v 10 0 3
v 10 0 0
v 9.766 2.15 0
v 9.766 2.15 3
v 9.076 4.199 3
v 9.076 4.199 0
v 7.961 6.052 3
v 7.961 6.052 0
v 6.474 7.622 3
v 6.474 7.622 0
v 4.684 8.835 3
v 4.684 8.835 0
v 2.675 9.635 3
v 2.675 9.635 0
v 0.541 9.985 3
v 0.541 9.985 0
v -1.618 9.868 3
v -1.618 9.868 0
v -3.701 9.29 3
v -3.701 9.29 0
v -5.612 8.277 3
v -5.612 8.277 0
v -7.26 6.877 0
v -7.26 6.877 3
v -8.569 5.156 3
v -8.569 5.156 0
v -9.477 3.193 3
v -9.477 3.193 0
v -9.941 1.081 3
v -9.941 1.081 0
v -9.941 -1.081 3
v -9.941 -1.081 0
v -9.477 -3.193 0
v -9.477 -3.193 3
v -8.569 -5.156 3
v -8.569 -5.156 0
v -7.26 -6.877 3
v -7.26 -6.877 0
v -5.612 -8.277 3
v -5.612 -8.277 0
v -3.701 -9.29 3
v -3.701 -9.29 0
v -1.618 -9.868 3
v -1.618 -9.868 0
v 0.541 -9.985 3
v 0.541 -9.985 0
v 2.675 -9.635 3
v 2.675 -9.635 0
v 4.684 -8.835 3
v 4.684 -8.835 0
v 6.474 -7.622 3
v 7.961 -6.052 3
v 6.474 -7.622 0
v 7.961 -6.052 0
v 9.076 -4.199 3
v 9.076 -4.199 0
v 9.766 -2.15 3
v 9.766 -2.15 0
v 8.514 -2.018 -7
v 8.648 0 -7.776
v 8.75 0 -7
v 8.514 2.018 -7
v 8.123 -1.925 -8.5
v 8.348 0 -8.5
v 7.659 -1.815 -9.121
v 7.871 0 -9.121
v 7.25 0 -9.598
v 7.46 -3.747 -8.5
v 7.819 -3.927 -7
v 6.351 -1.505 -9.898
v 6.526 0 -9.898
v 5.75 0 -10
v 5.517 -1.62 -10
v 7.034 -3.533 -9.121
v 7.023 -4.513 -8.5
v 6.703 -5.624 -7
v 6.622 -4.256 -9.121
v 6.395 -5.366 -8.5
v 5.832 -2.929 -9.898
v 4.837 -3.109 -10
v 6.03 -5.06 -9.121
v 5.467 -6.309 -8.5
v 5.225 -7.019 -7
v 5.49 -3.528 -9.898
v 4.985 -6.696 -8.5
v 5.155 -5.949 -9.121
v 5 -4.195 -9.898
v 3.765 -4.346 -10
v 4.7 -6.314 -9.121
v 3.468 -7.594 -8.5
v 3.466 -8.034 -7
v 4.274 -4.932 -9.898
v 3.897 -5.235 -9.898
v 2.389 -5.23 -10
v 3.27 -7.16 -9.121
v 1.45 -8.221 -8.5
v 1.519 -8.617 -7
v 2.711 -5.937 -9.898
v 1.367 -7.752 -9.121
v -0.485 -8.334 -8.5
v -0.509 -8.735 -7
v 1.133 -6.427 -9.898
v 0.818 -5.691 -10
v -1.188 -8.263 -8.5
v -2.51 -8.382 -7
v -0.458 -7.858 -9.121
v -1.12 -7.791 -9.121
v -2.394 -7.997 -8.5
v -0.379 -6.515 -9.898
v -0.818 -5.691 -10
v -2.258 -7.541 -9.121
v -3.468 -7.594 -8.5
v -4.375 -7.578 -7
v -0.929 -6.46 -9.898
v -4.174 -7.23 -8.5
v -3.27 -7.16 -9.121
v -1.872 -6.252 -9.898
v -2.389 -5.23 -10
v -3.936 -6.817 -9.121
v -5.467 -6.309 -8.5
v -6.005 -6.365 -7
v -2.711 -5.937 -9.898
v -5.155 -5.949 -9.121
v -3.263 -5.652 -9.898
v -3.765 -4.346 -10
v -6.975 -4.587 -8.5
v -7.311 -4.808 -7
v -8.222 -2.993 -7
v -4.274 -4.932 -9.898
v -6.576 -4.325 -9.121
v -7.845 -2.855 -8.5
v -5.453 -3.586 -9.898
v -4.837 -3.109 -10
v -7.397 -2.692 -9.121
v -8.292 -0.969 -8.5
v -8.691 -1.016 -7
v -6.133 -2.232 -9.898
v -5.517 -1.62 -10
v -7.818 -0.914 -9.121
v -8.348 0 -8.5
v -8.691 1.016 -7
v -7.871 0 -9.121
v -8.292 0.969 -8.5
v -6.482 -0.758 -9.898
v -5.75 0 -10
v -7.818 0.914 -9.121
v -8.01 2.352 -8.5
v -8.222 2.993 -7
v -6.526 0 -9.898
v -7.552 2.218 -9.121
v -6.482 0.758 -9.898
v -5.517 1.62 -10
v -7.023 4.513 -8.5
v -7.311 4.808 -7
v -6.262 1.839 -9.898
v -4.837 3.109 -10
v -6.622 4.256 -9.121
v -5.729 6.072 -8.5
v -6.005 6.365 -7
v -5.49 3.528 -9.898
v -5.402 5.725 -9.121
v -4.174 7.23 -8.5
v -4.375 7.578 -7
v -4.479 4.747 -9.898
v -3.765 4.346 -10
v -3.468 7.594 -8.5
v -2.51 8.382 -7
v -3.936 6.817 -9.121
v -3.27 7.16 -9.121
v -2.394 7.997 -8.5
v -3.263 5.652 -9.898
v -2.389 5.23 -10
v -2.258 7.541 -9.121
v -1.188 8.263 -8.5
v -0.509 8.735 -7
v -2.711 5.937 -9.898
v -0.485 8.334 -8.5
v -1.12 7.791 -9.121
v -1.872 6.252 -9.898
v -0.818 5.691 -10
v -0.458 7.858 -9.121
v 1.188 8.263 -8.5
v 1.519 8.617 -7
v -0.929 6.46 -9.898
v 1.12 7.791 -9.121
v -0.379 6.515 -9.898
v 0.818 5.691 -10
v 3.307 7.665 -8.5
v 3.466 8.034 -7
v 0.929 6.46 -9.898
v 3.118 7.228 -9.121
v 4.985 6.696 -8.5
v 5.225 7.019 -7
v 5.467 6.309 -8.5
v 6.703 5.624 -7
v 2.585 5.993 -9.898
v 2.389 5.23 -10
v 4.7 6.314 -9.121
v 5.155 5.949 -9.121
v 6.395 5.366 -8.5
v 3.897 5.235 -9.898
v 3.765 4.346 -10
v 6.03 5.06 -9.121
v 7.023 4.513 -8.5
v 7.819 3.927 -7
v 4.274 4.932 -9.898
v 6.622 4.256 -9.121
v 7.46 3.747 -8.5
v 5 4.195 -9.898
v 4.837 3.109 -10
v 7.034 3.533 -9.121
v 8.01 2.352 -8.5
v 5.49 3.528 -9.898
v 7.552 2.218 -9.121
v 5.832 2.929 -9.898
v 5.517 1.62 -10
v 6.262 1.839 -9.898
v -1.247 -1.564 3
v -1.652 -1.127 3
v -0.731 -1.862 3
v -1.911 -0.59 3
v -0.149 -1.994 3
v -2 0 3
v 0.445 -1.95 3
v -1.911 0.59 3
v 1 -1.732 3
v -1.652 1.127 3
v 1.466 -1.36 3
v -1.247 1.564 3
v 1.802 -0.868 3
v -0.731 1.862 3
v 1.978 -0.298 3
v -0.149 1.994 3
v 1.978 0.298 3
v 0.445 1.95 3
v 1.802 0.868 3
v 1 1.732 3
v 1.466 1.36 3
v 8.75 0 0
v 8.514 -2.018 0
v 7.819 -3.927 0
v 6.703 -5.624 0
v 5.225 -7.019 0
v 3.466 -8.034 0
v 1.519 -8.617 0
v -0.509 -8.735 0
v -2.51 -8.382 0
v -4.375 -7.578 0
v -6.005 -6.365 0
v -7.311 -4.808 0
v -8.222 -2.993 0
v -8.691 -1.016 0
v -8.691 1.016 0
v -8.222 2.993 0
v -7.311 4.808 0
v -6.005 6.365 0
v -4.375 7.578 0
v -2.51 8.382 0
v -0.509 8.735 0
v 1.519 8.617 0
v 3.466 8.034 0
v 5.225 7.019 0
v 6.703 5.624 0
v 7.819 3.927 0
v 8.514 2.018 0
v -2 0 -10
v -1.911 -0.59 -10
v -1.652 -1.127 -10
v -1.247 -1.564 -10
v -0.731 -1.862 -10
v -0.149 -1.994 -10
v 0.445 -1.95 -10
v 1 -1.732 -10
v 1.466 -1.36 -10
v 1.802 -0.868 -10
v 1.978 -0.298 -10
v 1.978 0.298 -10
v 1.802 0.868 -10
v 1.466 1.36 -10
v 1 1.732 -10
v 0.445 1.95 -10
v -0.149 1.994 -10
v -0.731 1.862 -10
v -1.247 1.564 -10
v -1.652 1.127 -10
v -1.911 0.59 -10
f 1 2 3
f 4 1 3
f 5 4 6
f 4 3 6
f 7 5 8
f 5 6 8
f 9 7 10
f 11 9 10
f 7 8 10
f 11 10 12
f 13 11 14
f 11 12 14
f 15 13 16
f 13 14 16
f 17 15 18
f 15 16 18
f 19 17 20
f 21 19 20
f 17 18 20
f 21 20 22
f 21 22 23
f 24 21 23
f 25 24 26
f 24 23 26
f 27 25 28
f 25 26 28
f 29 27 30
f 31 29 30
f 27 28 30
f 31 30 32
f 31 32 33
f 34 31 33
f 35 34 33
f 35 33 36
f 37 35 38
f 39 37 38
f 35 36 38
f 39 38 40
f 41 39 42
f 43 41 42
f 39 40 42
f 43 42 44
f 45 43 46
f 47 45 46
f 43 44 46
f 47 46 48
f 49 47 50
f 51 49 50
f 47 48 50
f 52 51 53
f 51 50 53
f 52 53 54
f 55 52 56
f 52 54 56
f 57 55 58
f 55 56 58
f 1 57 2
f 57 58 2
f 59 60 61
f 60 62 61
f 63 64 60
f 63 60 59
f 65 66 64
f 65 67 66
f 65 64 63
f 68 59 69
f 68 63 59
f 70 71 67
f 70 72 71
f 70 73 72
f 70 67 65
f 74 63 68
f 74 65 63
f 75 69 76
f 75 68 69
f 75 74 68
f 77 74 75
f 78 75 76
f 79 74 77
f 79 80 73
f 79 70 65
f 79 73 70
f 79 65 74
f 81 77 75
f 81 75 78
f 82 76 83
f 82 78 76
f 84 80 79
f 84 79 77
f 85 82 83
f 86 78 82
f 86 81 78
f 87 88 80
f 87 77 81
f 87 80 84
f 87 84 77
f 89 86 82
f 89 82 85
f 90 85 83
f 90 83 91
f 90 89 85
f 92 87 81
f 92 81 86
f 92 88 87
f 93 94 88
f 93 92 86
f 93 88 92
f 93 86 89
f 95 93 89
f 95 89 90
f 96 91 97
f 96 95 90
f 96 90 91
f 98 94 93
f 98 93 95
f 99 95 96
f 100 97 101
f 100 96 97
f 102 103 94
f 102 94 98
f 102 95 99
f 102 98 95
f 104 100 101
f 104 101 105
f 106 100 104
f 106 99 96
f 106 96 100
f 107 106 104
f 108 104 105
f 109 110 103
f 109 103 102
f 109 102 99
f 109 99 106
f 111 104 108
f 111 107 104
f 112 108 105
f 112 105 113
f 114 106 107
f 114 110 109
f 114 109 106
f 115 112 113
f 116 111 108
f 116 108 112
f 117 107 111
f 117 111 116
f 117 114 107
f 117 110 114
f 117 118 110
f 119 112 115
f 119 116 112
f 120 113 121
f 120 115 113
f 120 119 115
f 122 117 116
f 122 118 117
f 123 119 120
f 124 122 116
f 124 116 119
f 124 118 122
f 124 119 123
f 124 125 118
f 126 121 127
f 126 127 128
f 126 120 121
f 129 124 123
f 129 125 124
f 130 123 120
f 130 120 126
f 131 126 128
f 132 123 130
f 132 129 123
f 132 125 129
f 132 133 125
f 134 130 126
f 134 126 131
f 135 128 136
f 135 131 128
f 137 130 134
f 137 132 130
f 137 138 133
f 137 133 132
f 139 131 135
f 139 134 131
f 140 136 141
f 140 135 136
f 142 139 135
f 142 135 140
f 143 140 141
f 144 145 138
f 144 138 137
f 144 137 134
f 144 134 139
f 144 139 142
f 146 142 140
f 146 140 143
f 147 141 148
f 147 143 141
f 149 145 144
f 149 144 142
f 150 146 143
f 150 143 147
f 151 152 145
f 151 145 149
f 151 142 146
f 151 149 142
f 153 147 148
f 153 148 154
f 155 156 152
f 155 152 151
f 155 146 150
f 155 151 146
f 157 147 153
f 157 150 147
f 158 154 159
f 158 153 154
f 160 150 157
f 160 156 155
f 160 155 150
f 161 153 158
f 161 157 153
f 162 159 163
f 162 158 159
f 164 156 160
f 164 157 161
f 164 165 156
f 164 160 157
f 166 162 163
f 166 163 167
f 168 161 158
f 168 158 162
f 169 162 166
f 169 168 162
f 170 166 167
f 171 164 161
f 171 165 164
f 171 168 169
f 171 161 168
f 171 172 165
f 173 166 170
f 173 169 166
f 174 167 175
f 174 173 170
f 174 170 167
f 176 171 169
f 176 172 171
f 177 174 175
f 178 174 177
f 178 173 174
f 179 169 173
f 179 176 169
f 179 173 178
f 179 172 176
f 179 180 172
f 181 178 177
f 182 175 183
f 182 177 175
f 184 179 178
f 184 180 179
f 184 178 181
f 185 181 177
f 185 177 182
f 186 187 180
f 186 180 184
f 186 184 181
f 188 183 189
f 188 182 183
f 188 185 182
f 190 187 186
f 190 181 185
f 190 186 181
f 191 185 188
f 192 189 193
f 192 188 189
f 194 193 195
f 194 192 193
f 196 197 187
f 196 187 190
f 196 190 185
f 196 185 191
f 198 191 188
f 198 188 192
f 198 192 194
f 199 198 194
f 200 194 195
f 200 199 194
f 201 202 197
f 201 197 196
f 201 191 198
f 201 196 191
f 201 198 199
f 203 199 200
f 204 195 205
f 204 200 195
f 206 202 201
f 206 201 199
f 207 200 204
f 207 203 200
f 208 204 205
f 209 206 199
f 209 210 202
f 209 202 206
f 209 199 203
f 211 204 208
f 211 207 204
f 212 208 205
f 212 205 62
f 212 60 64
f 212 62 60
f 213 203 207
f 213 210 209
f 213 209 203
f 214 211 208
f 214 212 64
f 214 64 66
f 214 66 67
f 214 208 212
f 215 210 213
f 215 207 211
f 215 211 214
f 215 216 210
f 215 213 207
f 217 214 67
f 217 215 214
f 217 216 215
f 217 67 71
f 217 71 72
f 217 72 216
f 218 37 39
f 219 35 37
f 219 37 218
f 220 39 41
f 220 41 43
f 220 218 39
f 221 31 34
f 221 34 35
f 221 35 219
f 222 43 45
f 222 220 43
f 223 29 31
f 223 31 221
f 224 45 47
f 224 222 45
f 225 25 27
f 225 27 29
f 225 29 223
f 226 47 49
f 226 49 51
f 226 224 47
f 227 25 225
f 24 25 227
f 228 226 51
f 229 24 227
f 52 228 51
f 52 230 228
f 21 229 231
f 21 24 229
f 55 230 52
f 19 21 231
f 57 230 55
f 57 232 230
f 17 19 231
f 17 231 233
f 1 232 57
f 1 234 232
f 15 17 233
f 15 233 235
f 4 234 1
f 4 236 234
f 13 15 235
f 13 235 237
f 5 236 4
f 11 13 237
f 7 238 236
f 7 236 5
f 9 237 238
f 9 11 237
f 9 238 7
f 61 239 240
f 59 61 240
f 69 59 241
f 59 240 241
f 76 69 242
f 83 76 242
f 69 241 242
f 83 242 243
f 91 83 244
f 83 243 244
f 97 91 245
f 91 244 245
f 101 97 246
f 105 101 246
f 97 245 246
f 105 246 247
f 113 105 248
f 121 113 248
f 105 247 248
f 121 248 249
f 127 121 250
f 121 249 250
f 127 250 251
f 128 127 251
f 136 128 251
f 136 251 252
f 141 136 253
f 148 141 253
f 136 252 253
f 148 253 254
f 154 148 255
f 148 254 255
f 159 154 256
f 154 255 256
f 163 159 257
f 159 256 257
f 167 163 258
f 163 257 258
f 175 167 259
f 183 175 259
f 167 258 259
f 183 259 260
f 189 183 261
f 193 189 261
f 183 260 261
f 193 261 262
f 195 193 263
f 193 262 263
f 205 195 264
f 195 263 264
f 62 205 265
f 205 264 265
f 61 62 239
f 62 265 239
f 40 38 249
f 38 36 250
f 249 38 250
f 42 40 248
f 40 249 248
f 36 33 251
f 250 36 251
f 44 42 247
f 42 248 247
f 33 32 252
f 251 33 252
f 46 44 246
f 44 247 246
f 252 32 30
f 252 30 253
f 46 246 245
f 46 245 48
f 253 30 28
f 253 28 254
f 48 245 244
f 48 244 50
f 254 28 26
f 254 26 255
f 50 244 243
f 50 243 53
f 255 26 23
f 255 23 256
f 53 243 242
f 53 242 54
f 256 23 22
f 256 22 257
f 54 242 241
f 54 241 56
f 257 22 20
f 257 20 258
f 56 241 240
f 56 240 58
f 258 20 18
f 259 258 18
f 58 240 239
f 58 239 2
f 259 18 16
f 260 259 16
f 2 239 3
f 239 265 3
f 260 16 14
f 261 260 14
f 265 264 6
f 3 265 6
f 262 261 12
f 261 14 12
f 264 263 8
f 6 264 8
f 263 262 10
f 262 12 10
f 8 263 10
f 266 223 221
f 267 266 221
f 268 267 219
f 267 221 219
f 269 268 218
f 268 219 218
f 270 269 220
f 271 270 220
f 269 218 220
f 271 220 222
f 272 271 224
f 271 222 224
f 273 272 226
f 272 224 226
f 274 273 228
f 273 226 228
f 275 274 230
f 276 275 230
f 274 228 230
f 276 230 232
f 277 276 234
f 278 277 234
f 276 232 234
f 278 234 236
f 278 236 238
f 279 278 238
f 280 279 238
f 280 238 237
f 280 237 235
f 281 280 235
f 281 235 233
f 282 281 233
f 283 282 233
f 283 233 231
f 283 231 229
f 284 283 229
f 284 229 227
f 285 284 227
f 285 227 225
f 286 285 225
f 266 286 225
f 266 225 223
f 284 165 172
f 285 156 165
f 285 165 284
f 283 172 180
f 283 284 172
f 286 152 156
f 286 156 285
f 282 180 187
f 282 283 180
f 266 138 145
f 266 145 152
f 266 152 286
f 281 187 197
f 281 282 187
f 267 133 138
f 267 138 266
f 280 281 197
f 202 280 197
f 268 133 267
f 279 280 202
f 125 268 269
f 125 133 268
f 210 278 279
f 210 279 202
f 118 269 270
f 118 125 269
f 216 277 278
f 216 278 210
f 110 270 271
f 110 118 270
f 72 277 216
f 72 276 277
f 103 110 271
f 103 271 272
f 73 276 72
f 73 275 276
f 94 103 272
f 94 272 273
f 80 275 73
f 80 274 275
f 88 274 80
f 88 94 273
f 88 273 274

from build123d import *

# Parameters (mm, degrees)
F0_R     = 10
F1_DEPTH = 3
F2_R     = 8.75
F3_DEPTH = 10
F4_R     = 3
F6_D     = 4


with BuildPart() as f1:
    # F0 (on Top) → F1 (new body)
    with BuildSketch(Plane.XY):
        Circle(F0_R)
    extrude(amount=F1_DEPTH)

    # F2 (on face) → F3 (join)
    with BuildSketch(Plane(origin=(0, 0, 0), x_dir=(1, 0, 0), z_dir=(0, 0, -1))):
        Circle(F2_R)
    extrude(amount=F3_DEPTH)

    # F4
    f4_edges = [f1.edges().sort_by_distance(p)[0] for p in [
        (-8.75, 0, -10),
    ]]
    fillet(f4_edges, radius=F4_R)

    # F6 (through all)
    with Locations(Plane(origin=(0, 0, -10), x_dir=(1, 0, 0), z_dir=(0, 0, -1))):
        with Locations((0, 0)):
            Hole(F6_D / 2)


solid = f1.part
